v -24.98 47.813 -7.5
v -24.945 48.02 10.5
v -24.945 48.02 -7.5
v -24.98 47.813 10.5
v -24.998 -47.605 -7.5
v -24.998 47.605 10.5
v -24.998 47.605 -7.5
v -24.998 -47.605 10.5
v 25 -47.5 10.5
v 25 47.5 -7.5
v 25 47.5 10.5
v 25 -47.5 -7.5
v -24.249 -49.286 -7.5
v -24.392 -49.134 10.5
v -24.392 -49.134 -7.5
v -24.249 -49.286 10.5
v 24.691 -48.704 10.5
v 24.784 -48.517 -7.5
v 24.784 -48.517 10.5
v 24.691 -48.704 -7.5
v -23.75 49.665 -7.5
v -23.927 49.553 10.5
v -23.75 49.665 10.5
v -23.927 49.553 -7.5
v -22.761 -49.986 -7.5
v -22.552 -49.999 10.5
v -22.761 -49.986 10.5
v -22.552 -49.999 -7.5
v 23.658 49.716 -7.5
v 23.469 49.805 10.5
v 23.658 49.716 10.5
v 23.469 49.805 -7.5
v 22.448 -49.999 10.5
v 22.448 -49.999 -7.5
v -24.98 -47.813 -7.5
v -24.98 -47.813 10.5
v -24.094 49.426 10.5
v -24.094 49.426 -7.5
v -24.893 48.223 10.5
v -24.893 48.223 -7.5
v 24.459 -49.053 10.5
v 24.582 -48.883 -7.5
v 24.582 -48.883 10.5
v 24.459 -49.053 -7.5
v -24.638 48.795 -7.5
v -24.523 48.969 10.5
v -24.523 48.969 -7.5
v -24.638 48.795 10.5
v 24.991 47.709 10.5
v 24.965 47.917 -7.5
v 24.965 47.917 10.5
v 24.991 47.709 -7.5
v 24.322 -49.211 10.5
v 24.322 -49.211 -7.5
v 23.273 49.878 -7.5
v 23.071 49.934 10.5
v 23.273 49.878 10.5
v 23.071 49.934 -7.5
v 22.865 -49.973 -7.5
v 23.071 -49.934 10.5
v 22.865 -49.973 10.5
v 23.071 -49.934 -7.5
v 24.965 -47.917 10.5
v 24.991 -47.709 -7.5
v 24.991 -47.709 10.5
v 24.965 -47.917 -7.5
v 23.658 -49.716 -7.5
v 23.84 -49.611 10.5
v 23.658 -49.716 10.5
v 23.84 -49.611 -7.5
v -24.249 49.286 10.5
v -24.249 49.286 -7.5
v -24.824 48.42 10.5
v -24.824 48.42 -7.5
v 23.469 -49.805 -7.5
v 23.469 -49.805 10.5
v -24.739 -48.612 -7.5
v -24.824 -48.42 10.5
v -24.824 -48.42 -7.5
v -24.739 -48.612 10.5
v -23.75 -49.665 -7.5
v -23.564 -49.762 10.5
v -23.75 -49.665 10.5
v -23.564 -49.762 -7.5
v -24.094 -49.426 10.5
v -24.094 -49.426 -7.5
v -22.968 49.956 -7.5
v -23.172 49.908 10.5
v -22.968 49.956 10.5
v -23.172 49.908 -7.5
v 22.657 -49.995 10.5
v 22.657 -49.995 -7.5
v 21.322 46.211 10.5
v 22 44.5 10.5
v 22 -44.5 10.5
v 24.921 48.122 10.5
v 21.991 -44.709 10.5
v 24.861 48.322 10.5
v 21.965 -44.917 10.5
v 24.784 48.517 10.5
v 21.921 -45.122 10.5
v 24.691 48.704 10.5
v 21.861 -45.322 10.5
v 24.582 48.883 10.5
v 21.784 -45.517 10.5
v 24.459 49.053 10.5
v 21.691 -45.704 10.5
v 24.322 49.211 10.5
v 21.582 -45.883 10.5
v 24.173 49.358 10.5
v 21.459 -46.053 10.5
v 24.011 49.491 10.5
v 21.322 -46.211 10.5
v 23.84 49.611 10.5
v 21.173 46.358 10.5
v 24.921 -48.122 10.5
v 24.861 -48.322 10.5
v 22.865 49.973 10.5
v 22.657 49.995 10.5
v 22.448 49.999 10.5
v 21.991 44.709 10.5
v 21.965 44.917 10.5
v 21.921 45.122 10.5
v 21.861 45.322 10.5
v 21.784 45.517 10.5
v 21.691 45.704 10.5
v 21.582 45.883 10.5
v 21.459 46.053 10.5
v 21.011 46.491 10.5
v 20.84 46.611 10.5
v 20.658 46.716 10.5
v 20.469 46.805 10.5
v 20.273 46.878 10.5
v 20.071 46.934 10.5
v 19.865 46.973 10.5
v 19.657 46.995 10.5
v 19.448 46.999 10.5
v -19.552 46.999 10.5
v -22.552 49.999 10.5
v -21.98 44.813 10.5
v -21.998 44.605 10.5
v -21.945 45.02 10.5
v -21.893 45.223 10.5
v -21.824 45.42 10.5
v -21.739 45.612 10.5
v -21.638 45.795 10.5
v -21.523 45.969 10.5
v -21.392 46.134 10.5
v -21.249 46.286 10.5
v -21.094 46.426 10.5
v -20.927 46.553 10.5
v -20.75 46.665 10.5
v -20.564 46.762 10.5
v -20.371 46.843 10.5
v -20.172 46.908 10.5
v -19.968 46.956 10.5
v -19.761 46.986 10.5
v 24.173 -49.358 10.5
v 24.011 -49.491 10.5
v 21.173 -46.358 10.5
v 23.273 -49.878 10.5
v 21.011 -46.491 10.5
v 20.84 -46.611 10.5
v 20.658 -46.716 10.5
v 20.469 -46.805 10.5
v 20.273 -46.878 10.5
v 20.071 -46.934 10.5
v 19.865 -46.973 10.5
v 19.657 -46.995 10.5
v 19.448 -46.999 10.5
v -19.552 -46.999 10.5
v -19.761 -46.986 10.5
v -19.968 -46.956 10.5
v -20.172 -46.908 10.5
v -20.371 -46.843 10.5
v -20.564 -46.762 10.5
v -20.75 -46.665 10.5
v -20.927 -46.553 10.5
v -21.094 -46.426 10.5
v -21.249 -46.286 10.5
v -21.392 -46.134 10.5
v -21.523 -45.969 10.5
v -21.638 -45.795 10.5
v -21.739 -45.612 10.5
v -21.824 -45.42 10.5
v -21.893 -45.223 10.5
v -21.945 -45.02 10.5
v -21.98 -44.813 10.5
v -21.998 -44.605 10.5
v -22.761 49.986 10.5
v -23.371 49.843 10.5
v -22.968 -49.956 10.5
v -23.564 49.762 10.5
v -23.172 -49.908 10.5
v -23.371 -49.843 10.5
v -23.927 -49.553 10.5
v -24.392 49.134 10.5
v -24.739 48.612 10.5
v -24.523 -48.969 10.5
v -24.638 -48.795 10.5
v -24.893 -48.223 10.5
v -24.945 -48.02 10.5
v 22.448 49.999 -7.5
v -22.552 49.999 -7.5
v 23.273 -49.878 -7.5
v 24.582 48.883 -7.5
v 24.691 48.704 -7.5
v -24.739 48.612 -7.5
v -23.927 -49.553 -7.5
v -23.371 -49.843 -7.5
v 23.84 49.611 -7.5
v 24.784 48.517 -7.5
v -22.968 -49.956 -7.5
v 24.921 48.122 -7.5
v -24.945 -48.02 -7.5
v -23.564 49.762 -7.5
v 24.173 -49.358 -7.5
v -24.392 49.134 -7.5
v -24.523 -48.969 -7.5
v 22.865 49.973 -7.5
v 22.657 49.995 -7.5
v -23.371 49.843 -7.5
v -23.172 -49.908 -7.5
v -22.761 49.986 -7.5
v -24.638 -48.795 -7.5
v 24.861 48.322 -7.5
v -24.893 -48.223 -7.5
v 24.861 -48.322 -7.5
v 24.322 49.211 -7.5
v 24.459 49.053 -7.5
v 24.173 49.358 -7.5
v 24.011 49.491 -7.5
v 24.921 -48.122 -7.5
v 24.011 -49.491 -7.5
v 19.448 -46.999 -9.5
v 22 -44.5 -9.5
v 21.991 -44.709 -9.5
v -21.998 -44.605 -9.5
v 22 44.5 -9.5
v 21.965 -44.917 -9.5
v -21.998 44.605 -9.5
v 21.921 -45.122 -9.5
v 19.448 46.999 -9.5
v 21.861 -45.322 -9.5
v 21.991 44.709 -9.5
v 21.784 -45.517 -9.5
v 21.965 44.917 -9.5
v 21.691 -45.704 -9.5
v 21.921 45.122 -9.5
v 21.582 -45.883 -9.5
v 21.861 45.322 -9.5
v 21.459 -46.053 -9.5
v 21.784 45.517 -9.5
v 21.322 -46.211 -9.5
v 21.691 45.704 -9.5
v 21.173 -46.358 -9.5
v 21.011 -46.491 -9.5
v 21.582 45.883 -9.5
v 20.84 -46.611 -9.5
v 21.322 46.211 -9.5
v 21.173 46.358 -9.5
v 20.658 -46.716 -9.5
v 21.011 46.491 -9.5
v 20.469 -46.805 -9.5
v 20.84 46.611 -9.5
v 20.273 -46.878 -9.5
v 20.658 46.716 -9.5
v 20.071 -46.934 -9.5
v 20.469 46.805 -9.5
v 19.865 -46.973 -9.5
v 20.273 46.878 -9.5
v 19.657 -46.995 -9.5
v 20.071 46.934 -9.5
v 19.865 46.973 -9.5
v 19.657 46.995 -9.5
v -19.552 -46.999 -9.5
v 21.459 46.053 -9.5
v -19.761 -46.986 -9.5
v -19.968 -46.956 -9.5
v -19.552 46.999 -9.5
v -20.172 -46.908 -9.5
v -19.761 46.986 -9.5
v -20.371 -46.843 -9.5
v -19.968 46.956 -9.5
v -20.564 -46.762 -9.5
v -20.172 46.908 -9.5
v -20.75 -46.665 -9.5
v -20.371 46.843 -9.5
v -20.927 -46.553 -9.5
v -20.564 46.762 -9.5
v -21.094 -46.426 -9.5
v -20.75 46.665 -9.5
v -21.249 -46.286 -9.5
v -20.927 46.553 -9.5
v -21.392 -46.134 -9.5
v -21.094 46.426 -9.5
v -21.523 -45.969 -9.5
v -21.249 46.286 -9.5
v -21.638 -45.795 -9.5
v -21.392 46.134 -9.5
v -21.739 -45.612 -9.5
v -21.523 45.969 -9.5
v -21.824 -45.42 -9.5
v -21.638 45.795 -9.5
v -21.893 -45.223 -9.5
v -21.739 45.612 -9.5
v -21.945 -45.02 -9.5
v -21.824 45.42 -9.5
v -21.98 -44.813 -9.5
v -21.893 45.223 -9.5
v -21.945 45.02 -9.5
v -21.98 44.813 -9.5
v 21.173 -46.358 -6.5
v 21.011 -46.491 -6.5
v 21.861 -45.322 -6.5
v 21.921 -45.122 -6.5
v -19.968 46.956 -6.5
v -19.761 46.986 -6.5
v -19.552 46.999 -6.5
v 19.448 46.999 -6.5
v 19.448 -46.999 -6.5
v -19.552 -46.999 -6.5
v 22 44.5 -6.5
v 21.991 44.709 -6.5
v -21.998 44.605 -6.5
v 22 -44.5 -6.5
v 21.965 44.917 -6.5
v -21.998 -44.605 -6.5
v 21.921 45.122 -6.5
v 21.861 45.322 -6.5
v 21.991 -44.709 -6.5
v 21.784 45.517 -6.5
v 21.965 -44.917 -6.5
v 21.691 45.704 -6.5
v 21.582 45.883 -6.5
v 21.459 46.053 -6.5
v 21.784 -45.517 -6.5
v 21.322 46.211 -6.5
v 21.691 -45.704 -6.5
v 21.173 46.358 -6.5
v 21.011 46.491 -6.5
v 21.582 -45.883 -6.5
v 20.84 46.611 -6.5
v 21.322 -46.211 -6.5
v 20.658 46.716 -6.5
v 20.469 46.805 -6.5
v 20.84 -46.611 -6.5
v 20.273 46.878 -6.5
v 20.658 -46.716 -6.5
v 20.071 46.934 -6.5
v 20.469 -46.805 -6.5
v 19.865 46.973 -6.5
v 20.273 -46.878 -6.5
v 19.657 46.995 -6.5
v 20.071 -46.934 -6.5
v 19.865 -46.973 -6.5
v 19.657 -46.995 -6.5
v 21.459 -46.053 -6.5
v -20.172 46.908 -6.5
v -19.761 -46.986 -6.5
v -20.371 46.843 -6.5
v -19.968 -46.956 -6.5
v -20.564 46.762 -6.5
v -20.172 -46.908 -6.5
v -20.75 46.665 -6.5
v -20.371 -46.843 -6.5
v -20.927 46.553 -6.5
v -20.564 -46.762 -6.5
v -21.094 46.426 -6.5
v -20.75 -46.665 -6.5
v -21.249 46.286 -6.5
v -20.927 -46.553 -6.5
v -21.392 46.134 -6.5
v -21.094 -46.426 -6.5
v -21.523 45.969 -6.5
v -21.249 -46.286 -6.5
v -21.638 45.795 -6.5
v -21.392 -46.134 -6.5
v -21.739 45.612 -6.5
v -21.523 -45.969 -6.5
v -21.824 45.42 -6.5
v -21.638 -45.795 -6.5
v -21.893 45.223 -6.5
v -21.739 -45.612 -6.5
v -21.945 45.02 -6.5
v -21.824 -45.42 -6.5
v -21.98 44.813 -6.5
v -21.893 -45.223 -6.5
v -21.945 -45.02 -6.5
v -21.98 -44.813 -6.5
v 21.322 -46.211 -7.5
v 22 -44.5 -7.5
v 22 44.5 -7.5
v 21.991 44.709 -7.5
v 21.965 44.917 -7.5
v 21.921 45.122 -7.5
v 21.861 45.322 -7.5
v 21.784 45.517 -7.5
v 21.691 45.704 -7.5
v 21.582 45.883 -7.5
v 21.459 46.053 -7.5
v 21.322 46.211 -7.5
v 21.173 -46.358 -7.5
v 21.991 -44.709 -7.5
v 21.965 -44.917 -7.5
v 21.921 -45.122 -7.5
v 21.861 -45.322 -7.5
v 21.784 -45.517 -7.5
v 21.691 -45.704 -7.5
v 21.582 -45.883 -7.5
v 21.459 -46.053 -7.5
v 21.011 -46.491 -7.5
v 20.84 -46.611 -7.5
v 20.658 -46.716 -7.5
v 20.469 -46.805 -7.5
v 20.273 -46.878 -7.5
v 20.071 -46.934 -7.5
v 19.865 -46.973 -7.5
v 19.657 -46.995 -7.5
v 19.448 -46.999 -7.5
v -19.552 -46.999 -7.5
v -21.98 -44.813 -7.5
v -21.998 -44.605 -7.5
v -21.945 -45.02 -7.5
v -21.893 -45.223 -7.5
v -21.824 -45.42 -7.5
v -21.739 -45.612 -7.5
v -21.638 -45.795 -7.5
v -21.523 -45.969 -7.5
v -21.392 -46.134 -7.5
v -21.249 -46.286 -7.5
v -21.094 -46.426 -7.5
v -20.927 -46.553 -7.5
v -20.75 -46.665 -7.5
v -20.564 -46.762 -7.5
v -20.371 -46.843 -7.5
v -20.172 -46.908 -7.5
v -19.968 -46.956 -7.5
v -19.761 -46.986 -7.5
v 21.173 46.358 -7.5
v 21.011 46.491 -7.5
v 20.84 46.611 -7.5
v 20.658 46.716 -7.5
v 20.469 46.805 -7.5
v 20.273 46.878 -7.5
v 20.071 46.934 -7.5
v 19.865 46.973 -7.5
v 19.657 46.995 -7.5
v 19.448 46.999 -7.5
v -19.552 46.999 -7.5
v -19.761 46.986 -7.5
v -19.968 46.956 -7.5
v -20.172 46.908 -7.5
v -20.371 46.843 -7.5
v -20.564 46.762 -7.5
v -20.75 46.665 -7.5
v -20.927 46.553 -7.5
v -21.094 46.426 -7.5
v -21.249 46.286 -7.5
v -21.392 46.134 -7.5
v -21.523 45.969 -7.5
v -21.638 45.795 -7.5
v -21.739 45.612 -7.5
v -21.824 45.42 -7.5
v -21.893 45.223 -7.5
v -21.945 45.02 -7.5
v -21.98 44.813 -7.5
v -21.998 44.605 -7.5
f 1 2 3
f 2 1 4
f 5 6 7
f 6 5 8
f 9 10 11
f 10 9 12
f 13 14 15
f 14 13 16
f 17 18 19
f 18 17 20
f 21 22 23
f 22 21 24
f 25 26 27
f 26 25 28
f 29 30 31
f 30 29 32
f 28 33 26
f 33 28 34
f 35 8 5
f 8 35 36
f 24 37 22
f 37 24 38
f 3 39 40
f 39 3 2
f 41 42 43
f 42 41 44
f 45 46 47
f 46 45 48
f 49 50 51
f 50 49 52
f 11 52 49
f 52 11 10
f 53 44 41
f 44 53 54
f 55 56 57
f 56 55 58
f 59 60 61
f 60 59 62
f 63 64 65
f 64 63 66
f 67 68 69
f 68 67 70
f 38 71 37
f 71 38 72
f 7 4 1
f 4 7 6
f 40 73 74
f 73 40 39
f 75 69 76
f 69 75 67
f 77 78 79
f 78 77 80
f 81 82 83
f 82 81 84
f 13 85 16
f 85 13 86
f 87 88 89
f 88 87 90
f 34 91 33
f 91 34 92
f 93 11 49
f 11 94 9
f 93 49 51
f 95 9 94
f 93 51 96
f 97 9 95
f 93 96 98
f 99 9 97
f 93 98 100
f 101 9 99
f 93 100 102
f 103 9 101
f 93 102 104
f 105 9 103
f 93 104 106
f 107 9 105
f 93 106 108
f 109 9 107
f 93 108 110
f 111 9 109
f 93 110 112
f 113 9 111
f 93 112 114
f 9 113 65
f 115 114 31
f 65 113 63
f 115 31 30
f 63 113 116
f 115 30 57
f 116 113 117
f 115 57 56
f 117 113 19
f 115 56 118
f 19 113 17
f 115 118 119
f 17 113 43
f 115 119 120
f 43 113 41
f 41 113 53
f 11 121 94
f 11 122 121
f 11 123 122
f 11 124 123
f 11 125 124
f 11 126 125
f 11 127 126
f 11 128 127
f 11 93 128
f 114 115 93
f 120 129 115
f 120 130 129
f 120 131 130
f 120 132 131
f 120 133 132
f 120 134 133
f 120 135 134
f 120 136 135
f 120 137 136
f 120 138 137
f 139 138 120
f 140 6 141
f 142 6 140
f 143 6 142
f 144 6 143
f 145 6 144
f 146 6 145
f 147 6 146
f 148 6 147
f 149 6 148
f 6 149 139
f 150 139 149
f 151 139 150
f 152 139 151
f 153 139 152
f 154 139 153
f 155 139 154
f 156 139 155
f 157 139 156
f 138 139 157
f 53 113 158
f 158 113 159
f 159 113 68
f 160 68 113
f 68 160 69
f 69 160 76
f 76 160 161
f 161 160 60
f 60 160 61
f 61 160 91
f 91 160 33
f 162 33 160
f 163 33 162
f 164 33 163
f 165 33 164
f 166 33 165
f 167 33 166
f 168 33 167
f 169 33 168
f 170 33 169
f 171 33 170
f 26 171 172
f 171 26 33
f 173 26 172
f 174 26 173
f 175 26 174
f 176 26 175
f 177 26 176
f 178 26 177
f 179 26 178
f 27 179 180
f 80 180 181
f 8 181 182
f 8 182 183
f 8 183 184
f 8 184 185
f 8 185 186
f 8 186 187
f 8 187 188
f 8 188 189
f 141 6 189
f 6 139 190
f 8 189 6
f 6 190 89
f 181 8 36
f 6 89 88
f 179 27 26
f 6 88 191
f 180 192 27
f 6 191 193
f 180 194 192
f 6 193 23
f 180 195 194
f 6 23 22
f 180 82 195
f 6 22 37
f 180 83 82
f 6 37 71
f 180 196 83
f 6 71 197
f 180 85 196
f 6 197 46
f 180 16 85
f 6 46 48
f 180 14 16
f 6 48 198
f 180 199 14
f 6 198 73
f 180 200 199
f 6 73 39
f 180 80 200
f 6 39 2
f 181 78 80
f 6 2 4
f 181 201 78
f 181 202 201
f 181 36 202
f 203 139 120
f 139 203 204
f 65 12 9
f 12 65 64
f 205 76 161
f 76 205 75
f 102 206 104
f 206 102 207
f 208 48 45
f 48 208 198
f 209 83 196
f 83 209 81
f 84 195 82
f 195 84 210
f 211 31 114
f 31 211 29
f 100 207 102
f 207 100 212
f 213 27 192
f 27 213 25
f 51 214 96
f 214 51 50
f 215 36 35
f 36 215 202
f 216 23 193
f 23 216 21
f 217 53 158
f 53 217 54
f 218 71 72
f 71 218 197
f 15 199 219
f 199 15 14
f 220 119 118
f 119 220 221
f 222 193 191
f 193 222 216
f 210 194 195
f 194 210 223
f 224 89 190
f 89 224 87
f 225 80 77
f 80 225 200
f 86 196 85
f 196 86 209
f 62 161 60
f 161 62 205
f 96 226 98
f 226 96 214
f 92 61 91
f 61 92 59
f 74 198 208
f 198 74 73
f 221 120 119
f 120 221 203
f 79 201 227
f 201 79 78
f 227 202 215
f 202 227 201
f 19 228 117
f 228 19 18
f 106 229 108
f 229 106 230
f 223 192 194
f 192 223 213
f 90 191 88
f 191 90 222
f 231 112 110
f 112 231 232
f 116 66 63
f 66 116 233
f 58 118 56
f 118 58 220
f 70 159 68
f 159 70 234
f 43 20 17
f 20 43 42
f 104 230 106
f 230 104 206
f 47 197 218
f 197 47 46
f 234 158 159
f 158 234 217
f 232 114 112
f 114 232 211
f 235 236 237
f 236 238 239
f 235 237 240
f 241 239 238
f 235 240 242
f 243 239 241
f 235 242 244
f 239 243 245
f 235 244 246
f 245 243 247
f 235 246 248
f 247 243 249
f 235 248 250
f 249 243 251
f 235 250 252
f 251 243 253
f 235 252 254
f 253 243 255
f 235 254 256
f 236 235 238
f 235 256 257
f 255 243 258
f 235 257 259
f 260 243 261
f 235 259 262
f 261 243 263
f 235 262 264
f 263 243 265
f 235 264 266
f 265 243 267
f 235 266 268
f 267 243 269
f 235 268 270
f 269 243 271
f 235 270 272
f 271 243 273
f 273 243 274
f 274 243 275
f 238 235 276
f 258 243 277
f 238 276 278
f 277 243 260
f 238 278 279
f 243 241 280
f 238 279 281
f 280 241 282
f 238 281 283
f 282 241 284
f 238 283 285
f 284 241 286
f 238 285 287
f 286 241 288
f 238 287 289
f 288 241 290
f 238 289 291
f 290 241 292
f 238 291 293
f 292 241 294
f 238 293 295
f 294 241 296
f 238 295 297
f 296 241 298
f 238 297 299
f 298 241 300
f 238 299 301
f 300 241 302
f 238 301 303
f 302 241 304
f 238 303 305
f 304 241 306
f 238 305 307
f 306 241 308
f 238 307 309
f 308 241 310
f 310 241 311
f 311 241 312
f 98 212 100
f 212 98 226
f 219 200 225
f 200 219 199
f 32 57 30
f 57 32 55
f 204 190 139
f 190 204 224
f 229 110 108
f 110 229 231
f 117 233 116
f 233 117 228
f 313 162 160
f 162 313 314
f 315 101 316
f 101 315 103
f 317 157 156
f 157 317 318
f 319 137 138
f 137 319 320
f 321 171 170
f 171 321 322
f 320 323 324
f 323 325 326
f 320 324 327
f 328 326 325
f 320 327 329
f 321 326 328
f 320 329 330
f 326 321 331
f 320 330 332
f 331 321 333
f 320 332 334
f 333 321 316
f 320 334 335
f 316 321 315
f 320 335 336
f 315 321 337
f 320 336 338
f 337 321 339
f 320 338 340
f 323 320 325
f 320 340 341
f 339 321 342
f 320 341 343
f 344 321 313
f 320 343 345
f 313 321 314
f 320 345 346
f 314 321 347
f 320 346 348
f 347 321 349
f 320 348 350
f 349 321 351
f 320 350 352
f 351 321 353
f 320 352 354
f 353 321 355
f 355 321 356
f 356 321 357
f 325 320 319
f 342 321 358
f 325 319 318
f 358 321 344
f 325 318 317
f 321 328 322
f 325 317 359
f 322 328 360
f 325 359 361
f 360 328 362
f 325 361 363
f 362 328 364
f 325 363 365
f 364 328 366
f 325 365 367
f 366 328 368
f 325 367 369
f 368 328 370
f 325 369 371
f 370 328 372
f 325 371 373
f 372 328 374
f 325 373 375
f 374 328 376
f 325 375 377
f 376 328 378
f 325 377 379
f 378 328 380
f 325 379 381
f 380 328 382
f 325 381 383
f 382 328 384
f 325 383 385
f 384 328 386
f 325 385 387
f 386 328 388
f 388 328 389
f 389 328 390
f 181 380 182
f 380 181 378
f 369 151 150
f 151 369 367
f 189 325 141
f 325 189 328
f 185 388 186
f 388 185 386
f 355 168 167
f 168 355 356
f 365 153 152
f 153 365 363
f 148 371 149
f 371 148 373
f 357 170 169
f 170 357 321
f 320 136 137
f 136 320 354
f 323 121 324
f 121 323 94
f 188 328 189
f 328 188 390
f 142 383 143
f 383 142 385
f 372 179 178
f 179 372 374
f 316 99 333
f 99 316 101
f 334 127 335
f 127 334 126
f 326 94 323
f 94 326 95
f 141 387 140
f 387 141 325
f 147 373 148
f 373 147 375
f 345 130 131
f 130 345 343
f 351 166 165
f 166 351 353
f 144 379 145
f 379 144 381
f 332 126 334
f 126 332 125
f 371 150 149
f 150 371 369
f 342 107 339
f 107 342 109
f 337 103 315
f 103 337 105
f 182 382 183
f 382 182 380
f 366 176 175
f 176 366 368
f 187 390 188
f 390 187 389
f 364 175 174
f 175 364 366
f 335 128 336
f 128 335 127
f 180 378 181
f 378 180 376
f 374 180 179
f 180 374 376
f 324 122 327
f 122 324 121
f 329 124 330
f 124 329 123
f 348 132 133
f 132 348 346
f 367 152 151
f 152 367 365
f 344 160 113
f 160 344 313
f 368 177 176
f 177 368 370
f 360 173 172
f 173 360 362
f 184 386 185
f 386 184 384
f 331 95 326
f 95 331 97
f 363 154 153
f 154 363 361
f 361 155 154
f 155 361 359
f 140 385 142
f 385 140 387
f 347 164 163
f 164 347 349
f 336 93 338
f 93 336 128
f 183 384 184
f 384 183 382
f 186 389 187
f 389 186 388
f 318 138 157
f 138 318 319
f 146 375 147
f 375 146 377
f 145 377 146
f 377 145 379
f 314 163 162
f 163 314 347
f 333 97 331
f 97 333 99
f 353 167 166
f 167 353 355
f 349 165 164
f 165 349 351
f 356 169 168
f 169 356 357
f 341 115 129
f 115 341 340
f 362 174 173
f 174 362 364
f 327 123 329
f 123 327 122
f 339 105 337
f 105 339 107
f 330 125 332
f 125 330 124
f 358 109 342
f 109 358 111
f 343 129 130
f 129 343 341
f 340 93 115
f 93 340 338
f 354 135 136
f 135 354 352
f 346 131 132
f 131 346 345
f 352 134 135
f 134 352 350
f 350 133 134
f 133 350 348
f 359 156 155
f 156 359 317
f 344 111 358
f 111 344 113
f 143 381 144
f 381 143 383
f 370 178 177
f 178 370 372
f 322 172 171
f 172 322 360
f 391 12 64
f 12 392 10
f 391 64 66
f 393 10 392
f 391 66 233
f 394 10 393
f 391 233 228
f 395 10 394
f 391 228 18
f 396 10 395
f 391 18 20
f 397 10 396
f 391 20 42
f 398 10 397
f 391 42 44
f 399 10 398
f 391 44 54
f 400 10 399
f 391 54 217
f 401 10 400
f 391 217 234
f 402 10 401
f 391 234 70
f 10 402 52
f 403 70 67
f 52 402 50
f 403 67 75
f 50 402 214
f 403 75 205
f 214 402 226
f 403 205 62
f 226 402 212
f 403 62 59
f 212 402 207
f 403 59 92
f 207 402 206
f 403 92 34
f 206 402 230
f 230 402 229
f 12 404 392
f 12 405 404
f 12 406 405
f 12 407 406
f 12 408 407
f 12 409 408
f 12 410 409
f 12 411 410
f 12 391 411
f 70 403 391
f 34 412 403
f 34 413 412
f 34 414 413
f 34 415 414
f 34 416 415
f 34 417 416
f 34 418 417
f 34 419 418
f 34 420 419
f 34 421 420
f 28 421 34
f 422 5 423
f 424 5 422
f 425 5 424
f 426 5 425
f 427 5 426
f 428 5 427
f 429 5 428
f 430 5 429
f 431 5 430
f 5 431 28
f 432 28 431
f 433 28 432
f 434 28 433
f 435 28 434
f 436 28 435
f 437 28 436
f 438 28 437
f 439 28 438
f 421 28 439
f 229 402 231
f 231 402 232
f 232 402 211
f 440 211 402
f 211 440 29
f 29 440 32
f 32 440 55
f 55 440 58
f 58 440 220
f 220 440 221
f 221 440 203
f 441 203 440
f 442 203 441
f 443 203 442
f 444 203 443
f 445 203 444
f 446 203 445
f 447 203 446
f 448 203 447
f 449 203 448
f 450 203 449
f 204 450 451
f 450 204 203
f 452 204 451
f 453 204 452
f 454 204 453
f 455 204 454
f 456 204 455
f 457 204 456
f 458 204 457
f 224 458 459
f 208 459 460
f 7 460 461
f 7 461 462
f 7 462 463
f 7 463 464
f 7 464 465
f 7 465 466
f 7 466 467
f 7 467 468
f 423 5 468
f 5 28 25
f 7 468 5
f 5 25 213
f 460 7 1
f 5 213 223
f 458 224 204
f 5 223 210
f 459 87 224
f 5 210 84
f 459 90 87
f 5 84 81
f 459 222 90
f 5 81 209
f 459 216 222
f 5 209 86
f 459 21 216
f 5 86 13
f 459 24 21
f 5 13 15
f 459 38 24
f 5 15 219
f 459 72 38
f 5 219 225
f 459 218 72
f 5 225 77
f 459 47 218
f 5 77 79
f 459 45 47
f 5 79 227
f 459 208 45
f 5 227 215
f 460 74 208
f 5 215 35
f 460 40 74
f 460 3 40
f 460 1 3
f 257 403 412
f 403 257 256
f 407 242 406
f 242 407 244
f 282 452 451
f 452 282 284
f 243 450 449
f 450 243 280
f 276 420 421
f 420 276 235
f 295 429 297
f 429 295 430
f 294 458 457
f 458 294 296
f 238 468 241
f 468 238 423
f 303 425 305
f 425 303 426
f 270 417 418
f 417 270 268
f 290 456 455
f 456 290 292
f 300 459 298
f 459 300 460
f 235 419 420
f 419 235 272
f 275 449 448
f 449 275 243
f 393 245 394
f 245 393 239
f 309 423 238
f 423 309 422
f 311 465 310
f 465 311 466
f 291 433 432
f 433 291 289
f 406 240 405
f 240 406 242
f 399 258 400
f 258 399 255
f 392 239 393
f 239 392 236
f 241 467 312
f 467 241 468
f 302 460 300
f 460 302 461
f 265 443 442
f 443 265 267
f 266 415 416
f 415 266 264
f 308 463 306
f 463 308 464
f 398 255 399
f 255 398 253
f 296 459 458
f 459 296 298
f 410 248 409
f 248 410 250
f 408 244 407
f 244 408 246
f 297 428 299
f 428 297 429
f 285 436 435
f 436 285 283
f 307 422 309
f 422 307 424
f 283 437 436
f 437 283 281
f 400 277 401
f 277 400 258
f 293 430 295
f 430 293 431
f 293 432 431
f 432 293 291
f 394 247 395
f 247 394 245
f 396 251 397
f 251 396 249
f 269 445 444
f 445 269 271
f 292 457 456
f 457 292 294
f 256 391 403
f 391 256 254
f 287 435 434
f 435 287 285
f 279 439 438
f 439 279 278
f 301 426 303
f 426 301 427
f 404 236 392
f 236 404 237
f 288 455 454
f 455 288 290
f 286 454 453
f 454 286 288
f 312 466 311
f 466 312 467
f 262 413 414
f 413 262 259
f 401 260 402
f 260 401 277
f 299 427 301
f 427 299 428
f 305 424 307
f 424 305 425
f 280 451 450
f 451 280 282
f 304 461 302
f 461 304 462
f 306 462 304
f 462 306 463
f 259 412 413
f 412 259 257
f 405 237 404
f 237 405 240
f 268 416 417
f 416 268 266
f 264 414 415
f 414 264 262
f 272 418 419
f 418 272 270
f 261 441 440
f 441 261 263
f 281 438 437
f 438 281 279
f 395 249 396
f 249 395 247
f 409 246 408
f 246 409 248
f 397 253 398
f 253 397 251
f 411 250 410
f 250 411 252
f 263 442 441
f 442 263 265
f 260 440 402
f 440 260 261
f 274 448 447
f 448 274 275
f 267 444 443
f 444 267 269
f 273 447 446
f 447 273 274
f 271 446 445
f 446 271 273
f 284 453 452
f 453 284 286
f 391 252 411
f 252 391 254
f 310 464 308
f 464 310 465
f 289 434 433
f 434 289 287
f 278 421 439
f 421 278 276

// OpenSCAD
fnQuali=75;

module boxBody(depth, width, height,roundsize) {
    union() {
        minkowski() {
            cube([  width - (roundsize),
                    depth - (roundsize),
                    height - 1], true);
            cylinder(d=roundsize, h=1, $fn=fnQuali);
        }
    }
}

module boxRecess(depth,width,height,roundsize,wallthick) {
    union() {
        minkowski() {
            cube([  width - (2 * wallthick) - (roundsize),
                    depth - (2 * wallthick) - (roundsize),
                    height - 1], true);
            cylinder(d=roundsize, h=1, $fn=fnQuali);
        }
    }
}

module boxFrame(depth,width,height,roundsize,wallthick) {
    union() {
        difference() {
            boxBody(depth,width,height,roundsize);
            translate([0,0,wallthick])
                boxRecess(depth,width,height,roundsize,wallthick);
        }
    }
}


module box(depth = 100, width = 50, height = 20, roundsize = 5, wallthick = 4, bottomborder = 1) {
    if (bottomborder >= wallthick) {
        echo("WARNING");
        echo("WARNING: bottomborder >= wallthick!!");
        echo("WARNING");
    }
    union() {
        difference() {
            boxFrame(depth,width,height,roundsize,wallthick);
            translate([0,0,-(height - bottomborder)])
                    boxFrame(depth,width,height,roundsize,wallthick);
        }
    }
}



module divider(orientation = "horizontal", length = 100, height = 20, wallthick = 4, dividerthick = 2) {
    if (orientation == "horizontal") {
        rotate([0,0,90])
            cube([length - (2*wallthick), dividerthick, height], true);

    }
    cube([length, dividerthick, height], true);
}


box(depth = 100, width = 50, height = 20, roundsize = 5, wallthick = 3, bottomborder = 2);
*divider(orientation = "horizontal", length = 100, height = 20, wallthick = 4, dividerthick = 2);
